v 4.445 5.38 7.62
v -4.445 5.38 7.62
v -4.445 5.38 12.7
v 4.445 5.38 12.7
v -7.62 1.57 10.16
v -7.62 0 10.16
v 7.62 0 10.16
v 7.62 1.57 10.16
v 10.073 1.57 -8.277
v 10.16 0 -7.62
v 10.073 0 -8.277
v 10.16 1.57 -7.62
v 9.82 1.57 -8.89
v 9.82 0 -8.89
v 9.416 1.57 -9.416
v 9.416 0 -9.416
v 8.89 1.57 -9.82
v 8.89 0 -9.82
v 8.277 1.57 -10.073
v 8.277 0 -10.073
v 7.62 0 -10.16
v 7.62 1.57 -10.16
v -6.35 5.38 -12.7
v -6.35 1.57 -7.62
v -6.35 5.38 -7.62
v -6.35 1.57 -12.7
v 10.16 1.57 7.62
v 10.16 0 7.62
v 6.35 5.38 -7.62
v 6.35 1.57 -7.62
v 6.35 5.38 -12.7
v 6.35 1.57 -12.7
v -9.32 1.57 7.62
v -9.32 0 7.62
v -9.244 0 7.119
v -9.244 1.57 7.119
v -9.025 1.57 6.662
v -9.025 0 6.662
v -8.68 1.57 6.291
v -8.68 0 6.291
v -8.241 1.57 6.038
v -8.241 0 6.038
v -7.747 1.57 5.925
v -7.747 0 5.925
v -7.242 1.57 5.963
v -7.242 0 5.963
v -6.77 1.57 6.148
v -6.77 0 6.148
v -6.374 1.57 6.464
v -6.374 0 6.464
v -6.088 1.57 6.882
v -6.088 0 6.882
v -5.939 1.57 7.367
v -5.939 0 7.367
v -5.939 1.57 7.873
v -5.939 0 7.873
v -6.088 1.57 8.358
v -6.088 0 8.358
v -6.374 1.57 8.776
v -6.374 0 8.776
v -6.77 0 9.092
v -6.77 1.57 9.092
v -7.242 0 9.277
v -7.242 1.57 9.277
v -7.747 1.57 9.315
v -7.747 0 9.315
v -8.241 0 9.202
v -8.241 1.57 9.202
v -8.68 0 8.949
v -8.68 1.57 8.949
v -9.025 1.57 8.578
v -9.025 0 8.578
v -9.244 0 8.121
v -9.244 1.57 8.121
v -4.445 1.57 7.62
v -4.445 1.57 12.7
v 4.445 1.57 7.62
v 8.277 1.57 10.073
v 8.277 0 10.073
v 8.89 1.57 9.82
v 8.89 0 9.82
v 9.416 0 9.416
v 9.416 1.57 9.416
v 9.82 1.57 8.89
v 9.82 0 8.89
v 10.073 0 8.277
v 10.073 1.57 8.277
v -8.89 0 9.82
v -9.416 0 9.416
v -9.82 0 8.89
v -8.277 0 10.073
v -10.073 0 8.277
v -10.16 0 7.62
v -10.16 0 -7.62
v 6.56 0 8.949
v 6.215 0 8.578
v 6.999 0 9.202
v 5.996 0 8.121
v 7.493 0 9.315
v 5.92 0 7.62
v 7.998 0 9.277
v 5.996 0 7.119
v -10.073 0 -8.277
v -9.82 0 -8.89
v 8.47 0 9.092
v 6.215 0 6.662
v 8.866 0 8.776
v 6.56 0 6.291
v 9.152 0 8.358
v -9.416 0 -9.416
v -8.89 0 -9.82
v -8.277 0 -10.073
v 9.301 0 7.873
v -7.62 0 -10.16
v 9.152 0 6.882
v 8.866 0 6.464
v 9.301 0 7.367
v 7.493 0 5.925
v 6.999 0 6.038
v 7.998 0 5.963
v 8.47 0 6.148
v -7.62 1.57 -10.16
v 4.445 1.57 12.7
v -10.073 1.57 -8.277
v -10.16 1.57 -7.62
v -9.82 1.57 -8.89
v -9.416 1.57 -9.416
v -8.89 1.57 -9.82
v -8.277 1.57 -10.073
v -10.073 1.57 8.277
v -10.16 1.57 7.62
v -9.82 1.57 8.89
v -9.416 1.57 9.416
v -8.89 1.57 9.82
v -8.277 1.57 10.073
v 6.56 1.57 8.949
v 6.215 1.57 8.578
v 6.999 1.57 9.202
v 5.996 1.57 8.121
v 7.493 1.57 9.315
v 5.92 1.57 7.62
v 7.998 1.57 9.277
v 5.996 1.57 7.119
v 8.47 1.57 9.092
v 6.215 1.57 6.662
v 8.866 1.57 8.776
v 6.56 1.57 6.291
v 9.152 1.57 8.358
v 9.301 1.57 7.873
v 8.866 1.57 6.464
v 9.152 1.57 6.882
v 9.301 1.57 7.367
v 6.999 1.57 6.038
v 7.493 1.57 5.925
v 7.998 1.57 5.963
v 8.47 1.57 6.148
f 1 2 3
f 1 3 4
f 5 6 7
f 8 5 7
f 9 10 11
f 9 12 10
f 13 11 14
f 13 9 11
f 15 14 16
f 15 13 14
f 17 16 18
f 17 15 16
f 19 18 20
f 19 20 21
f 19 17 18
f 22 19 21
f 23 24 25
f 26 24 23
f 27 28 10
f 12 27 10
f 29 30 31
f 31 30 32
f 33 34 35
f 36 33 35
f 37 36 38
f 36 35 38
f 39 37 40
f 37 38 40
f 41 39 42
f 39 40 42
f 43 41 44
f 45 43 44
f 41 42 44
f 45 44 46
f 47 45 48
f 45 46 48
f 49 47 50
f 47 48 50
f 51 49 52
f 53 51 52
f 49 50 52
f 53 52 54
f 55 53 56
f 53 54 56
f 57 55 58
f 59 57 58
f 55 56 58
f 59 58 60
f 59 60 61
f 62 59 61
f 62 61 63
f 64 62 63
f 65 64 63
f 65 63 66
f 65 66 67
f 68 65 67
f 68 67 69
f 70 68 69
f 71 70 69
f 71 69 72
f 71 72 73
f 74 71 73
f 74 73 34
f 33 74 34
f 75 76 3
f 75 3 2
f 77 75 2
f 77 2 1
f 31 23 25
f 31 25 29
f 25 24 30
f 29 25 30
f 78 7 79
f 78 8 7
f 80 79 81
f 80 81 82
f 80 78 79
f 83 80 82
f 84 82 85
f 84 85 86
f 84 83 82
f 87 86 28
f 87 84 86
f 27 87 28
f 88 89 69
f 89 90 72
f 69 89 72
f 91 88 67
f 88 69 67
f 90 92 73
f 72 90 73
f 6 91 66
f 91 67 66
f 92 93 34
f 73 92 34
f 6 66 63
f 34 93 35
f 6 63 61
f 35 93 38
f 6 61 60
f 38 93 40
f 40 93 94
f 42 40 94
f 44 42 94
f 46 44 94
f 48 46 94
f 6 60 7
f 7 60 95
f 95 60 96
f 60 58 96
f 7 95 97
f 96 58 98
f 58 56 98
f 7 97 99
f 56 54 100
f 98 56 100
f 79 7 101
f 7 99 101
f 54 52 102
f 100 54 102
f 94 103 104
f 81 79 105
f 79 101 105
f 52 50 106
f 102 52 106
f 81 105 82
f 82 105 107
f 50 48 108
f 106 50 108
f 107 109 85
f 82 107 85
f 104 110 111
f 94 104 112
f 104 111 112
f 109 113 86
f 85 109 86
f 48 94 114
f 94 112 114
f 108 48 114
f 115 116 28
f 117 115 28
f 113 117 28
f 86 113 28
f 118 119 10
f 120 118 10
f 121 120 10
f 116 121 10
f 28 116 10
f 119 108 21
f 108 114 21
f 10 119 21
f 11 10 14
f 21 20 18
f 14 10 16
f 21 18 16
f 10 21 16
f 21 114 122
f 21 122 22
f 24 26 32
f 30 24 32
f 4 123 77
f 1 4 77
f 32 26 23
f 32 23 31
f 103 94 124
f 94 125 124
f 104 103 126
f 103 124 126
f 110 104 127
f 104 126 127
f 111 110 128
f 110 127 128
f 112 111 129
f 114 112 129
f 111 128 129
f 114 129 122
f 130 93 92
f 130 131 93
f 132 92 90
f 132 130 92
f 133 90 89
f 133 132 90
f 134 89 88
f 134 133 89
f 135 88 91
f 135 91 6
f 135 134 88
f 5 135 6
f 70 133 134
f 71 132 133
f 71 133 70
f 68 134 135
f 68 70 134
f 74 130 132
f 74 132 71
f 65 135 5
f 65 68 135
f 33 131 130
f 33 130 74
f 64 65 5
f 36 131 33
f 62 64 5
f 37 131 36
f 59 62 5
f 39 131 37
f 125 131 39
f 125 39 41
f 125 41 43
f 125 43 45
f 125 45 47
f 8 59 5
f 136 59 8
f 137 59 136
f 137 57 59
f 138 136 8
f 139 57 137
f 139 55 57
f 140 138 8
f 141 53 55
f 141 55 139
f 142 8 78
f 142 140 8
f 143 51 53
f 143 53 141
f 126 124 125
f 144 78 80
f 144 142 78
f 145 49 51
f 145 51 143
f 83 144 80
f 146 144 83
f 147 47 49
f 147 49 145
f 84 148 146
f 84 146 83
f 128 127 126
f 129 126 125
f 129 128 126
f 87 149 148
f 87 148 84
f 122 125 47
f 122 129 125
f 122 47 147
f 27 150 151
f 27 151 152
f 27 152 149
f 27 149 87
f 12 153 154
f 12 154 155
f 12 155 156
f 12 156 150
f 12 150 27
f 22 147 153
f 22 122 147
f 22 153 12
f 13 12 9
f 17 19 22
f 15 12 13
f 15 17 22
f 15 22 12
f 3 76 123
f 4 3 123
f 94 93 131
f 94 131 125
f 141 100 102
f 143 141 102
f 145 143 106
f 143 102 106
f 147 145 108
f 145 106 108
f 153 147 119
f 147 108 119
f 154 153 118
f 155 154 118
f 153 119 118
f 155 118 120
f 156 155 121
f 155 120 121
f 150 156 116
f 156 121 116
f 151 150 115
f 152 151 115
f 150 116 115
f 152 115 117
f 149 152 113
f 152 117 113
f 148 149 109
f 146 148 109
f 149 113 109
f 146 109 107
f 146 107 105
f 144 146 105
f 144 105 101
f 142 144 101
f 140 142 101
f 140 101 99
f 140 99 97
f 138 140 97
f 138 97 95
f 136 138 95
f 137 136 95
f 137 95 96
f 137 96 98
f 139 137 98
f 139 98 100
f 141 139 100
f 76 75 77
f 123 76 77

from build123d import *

# Parameters (mm, degrees)
SKETCH1_W             = 20.32
SKETCH1_H             = 20.32
BOSS_EXTRUDE1_DEPTH   = 1.57
FILLET1_R             = 2.54
M3_CLEARANCE_HOLE1_D  = 3.4
SKETCH4_W             = 8.89
SKETCH4_H             = 5.08
BOSS_EXTRUDE2_DEPTH   = 3.81
SKETCH4_W_2           = 12.7
BOSS_EXTRUDE2_2_DEPTH = 3.81


with BuildPart() as part:
    # Sketch1 → Boss-Extrude1 (new body)
    with BuildSketch(Plane(origin=(0, 0, 0), x_dir=(1, 0, 0), z_dir=(0, 1, 0))):
        Rectangle(SKETCH1_W, SKETCH1_H)
    extrude(amount=BOSS_EXTRUDE1_DEPTH)

    # Fillet1
    fillet1_edges = [part.edges().sort_by_distance(p)[0] for p in [
        (10.16, 0.785, 10.16),
        (-10.16, 0.785, 10.16),
        (-10.16, 0.785, -10.16),
        (10.16, 0.785, -10.16),
    ]]
    fillet(fillet1_edges, radius=FILLET1_R)

    # M3 Clearance Hole1 (through all)
    with Locations(Plane(origin=(0, 1.57, 0), x_dir=(1, 0, 0), z_dir=(0, 1, 0))):
        with Locations((-7.62, -7.62), (7.62, -7.62)):
            Hole(M3_CLEARANCE_HOLE1_D / 2)


with BuildPart() as body_2:
    # Sketch4 → Boss-Extrude2 (new body)
    with BuildSketch(Plane(origin=(0, 1.57, 0), x_dir=(1, 0, 0), z_dir=(0, 1, 0))):
        with Locations((0, -10.16)):
            Rectangle(SKETCH4_W, SKETCH4_H)
    extrude(amount=BOSS_EXTRUDE2_DEPTH)


with BuildPart() as body_3:
    # Sketch4 → Boss-Extrude2 2 (new body)
    with BuildSketch(Plane(origin=(0, 1.57, 0), x_dir=(1, 0, 0), z_dir=(0, 1, 0))):
        with Locations((0, 10.16)):
            Rectangle(SKETCH4_W_2, SKETCH4_H)
    extrude(amount=BOSS_EXTRUDE2_2_DEPTH)


solid = Compound([part.part, body_2.part, body_3.part])
